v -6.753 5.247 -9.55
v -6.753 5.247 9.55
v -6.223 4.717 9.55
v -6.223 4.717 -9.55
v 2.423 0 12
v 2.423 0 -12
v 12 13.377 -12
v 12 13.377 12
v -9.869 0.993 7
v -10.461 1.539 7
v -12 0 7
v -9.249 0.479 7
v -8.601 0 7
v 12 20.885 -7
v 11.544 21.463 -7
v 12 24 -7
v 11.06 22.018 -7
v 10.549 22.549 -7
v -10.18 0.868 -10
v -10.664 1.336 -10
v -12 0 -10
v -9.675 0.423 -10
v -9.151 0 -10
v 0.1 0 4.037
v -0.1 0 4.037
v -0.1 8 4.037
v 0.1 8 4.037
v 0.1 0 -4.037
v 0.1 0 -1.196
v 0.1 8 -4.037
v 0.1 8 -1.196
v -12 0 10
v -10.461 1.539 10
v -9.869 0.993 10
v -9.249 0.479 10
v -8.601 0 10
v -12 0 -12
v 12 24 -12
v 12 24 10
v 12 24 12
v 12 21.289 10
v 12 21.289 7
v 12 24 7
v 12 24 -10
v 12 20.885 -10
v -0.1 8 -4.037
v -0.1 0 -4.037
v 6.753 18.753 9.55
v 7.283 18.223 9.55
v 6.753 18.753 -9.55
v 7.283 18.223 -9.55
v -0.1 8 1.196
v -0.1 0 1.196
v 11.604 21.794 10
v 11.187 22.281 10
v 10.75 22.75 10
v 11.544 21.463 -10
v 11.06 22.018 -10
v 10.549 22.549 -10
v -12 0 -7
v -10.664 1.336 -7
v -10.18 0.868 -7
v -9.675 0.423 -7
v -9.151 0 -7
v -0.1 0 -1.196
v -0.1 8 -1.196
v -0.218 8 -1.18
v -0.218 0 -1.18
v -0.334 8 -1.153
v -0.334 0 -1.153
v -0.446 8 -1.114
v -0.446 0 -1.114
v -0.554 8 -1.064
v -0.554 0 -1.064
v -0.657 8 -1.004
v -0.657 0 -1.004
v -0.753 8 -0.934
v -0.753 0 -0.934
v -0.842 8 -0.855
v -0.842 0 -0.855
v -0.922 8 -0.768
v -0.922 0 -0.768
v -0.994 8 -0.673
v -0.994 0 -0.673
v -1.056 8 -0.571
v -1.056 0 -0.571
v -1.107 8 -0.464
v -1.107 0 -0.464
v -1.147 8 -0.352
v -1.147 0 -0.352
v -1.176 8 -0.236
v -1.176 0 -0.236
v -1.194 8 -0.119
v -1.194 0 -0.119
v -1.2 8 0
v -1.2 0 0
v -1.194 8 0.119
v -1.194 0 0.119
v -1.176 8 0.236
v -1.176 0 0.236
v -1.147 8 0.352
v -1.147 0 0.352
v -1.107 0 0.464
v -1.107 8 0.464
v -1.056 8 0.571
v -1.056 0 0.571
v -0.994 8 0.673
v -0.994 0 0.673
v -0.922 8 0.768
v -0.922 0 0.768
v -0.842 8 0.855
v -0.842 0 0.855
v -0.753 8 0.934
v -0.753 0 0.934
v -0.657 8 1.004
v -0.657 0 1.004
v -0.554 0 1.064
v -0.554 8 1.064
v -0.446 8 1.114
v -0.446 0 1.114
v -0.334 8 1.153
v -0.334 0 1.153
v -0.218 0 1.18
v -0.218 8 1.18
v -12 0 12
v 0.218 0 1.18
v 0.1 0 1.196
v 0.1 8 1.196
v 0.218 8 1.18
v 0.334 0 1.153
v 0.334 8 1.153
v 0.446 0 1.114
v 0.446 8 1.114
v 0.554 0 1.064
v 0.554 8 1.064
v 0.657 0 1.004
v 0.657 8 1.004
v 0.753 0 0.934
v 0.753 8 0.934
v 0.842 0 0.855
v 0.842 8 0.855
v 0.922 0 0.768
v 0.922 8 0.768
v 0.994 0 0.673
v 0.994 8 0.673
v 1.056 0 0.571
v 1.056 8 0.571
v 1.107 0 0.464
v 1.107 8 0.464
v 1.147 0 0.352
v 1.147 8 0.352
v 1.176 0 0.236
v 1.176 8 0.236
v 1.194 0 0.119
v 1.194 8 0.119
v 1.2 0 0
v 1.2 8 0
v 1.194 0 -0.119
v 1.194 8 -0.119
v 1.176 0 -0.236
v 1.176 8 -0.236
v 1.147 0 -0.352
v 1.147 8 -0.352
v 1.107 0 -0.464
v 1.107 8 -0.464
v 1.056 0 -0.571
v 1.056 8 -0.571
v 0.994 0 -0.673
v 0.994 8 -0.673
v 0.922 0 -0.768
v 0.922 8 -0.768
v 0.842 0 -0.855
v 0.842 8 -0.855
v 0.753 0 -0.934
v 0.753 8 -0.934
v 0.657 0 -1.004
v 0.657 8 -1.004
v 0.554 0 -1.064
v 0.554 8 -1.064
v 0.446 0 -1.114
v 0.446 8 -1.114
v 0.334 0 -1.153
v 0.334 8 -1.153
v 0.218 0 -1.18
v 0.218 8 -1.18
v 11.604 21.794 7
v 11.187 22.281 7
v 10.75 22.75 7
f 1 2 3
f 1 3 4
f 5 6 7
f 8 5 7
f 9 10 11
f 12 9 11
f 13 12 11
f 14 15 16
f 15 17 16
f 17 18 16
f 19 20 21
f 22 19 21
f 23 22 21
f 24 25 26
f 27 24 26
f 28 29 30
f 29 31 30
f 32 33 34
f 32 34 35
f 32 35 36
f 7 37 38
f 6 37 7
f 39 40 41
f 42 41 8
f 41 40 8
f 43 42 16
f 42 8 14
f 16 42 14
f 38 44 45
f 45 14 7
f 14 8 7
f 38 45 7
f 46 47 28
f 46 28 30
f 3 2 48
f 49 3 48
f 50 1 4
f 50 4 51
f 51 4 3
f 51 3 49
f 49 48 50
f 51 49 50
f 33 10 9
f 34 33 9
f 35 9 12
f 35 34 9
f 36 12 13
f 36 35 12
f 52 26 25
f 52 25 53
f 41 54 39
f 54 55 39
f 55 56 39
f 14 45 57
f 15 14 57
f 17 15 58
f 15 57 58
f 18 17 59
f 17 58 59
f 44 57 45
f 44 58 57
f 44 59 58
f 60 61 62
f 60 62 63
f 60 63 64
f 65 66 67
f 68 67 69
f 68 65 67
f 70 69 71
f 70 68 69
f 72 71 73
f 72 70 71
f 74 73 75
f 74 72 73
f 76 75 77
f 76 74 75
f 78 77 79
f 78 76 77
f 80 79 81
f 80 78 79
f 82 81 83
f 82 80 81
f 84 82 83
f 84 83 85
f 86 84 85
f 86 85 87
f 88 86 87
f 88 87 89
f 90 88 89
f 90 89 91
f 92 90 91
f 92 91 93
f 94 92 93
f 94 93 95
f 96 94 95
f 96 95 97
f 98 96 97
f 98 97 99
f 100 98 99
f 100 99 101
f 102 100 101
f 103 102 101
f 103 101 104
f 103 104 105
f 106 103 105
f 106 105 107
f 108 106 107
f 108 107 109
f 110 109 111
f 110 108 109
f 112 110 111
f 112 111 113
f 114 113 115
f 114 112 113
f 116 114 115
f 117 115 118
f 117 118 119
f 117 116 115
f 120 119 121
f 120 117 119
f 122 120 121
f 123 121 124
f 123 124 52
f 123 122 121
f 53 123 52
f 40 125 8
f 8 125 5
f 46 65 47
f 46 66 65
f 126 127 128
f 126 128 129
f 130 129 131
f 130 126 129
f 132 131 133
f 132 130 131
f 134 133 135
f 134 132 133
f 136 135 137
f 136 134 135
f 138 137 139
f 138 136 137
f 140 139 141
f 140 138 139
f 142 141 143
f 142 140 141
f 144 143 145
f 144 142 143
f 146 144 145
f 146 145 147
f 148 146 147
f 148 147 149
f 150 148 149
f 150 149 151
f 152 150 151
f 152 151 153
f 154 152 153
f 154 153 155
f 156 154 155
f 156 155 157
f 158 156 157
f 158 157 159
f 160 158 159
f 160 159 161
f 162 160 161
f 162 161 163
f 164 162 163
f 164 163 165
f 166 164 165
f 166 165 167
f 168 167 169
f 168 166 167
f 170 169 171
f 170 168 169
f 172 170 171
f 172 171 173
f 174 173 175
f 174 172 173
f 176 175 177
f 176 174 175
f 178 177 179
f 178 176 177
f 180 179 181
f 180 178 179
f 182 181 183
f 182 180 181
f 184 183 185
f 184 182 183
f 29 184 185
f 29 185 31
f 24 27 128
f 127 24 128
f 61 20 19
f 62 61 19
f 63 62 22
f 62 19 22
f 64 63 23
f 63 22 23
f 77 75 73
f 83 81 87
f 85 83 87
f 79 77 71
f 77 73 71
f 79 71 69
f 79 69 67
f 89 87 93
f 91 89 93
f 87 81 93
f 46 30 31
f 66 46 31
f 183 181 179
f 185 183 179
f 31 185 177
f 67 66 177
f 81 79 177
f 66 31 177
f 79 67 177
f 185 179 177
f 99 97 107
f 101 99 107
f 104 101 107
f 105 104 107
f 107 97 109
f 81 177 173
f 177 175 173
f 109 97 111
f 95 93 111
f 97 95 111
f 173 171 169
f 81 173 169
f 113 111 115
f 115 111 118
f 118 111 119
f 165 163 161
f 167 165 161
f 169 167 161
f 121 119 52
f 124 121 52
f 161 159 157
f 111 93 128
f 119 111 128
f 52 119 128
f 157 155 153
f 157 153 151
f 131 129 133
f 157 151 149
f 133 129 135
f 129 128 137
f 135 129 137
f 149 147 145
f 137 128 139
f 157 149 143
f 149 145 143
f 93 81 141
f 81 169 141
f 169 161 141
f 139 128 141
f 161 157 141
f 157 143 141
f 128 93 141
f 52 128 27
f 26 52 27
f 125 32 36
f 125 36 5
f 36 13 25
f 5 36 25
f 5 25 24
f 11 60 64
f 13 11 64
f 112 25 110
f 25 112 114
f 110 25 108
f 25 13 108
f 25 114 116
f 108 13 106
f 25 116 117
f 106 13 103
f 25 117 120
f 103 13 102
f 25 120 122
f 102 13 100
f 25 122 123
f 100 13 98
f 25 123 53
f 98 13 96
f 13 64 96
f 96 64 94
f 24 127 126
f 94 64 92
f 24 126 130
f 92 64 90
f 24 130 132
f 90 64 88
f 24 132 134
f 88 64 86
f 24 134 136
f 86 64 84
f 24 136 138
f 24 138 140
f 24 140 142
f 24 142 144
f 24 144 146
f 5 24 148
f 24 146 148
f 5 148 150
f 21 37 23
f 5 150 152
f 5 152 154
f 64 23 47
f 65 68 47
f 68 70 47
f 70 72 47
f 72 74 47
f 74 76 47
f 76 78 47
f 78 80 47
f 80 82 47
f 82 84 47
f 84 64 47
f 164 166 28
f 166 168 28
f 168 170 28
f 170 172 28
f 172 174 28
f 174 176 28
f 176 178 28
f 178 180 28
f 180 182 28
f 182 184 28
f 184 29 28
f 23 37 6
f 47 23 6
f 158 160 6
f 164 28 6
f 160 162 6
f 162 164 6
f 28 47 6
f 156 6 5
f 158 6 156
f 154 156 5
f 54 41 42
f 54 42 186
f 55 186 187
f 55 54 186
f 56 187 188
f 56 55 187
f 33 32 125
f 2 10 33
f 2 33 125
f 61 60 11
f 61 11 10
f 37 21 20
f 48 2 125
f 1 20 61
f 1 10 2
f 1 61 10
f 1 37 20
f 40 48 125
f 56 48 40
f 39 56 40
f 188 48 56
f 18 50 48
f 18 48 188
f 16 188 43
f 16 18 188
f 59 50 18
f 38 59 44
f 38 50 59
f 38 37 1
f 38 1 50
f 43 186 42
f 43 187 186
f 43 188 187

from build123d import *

# Parameters (mm, degrees)
SKETCH_1_W               = 24
SKETCH_1_H               = 24
EXTRUDE_1_DEPTH          = 24
SKETCH_2_W               = 71.732005
SKETCH_2_H               = 64.325513166
CUT_EXTRUDE_1_DEPTH      = 24
SKETCH_3_W               = 19.1
SKETCH_3_H               = 19.1
CUT_EXTRUDE_2_DEPTH      = 0.75
SKETCH_4_R               = 20.316156742
SKETCH_4_R_2             = 15
CUT_EXTRUDE_3_DEPTH      = 3
SKETCH_5_R               = 19.778815759
SKETCH_5_R_2             = 15
CUT_EXTRUDE_4_DEPTH      = 3
SKETCH_6_R               = 1.2
CUT_EXTRUDE_5_DEPTH      = 8
CUT_EXTRUDE_6_DEPTH      = 0.1
CUT_EXTRUDE_6_DEPTH_BACK = 0.1
SKETCH_7_W               = 8.073607186
SKETCH_7_H               = 16
CUT_EXTRUDE_7_DEPTH      = 15
CUT_EXTRUDE_7_DEPTH_BACK = 15


with BuildPart() as part:
    # Эскиз1 → Бобышка-Вытянуть1 (new body)
    with BuildSketch(Plane(origin=(0, 0, 0), x_dir=(1, 0, 0), z_dir=(0, 1, 0))):
        Rectangle(SKETCH_1_W, SKETCH_1_H)
    extrude(amount=EXTRUDE_1_DEPTH)

    # Эскиз2 → Вырез-Вытянуть1 (cut)
    with BuildSketch(Plane(origin=(-6, 6, 0), x_dir=(0.7071067811865477, 0.7071067811865475, 0), z_dir=(-0.7071067811865475, 0.7071067811865477, 0))):
        Rectangle(SKETCH_2_W, SKETCH_2_H)
    extrude(amount=CUT_EXTRUDE_1_DEPTH, mode=Mode.SUBTRACT)

    # Эскиз3 → Вырез-Вытянуть2 (cut)
    with BuildSketch(Plane(origin=(-6, 6, 0), x_dir=(0.7071067811865476, 0.7071067811865476, 0), z_dir=(-0.7071067811865476, 0.7071067811865476, 0))):
        with Locations((8.485281374, 0)):
            Rectangle(SKETCH_3_W, SKETCH_3_H)
    extrude(amount=-CUT_EXTRUDE_2_DEPTH, mode=Mode.SUBTRACT)

    # Эскиз4 → Вырез-Вытянуть3 (cut)
    with BuildSketch(Plane.XY.offset(10)):
        with Locations((0, 12.288929334)):
            Circle(SKETCH_4_R)
        with Locations((0, 12.288929334)):
            Circle(SKETCH_4_R_2, mode=Mode.SUBTRACT)
    extrude(amount=-CUT_EXTRUDE_3_DEPTH, mode=Mode.SUBTRACT)

    # Эскиз5 → Вырез-Вытянуть4 (cut)
    with BuildSketch(Plane.XY.offset(-10)):
        with Locations((0, 11.885010241)):
            Circle(SKETCH_5_R)
        with Locations((0, 11.885010241)):
            Circle(SKETCH_5_R_2, mode=Mode.SUBTRACT)
    extrude(amount=CUT_EXTRUDE_4_DEPTH, mode=Mode.SUBTRACT)

    # Эскиз6 → Вырез-Вытянуть5 (cut)
    with BuildSketch(Plane(origin=(0, 0, 0), x_dir=(1, 0, 0), z_dir=(0, 1, 0))):
        Circle(SKETCH_6_R)
    extrude(amount=CUT_EXTRUDE_5_DEPTH, mode=Mode.SUBTRACT)

    # Эскиз7 → Вырез-Вытянуть6 (cut, two sides: drawn at the far end of the back side and taken through both)
    with BuildSketch(Plane(origin=(0, 0, 0), x_dir=(0, 0, -1), z_dir=(1, 0, 0)).offset(-CUT_EXTRUDE_6_DEPTH_BACK)):
        Rectangle(SKETCH_7_W, SKETCH_7_H)
    extrude(amount=CUT_EXTRUDE_6_DEPTH + CUT_EXTRUDE_6_DEPTH_BACK, mode=Mode.SUBTRACT)

    # Эскиз8 → Вырез-Вытянуть7 (cut, two sides: drawn at the far end of the back side and taken through both)
    with BuildSketch(Plane.XY.offset(-CUT_EXTRUDE_7_DEPTH_BACK)):
        Polygon((0.926133031, -2.090276762), (18.080980338, 21.871040762), (23.544619253, -7.469690988), align=None)
    extrude(amount=CUT_EXTRUDE_7_DEPTH + CUT_EXTRUDE_7_DEPTH_BACK, mode=Mode.SUBTRACT)


solid = part.part
